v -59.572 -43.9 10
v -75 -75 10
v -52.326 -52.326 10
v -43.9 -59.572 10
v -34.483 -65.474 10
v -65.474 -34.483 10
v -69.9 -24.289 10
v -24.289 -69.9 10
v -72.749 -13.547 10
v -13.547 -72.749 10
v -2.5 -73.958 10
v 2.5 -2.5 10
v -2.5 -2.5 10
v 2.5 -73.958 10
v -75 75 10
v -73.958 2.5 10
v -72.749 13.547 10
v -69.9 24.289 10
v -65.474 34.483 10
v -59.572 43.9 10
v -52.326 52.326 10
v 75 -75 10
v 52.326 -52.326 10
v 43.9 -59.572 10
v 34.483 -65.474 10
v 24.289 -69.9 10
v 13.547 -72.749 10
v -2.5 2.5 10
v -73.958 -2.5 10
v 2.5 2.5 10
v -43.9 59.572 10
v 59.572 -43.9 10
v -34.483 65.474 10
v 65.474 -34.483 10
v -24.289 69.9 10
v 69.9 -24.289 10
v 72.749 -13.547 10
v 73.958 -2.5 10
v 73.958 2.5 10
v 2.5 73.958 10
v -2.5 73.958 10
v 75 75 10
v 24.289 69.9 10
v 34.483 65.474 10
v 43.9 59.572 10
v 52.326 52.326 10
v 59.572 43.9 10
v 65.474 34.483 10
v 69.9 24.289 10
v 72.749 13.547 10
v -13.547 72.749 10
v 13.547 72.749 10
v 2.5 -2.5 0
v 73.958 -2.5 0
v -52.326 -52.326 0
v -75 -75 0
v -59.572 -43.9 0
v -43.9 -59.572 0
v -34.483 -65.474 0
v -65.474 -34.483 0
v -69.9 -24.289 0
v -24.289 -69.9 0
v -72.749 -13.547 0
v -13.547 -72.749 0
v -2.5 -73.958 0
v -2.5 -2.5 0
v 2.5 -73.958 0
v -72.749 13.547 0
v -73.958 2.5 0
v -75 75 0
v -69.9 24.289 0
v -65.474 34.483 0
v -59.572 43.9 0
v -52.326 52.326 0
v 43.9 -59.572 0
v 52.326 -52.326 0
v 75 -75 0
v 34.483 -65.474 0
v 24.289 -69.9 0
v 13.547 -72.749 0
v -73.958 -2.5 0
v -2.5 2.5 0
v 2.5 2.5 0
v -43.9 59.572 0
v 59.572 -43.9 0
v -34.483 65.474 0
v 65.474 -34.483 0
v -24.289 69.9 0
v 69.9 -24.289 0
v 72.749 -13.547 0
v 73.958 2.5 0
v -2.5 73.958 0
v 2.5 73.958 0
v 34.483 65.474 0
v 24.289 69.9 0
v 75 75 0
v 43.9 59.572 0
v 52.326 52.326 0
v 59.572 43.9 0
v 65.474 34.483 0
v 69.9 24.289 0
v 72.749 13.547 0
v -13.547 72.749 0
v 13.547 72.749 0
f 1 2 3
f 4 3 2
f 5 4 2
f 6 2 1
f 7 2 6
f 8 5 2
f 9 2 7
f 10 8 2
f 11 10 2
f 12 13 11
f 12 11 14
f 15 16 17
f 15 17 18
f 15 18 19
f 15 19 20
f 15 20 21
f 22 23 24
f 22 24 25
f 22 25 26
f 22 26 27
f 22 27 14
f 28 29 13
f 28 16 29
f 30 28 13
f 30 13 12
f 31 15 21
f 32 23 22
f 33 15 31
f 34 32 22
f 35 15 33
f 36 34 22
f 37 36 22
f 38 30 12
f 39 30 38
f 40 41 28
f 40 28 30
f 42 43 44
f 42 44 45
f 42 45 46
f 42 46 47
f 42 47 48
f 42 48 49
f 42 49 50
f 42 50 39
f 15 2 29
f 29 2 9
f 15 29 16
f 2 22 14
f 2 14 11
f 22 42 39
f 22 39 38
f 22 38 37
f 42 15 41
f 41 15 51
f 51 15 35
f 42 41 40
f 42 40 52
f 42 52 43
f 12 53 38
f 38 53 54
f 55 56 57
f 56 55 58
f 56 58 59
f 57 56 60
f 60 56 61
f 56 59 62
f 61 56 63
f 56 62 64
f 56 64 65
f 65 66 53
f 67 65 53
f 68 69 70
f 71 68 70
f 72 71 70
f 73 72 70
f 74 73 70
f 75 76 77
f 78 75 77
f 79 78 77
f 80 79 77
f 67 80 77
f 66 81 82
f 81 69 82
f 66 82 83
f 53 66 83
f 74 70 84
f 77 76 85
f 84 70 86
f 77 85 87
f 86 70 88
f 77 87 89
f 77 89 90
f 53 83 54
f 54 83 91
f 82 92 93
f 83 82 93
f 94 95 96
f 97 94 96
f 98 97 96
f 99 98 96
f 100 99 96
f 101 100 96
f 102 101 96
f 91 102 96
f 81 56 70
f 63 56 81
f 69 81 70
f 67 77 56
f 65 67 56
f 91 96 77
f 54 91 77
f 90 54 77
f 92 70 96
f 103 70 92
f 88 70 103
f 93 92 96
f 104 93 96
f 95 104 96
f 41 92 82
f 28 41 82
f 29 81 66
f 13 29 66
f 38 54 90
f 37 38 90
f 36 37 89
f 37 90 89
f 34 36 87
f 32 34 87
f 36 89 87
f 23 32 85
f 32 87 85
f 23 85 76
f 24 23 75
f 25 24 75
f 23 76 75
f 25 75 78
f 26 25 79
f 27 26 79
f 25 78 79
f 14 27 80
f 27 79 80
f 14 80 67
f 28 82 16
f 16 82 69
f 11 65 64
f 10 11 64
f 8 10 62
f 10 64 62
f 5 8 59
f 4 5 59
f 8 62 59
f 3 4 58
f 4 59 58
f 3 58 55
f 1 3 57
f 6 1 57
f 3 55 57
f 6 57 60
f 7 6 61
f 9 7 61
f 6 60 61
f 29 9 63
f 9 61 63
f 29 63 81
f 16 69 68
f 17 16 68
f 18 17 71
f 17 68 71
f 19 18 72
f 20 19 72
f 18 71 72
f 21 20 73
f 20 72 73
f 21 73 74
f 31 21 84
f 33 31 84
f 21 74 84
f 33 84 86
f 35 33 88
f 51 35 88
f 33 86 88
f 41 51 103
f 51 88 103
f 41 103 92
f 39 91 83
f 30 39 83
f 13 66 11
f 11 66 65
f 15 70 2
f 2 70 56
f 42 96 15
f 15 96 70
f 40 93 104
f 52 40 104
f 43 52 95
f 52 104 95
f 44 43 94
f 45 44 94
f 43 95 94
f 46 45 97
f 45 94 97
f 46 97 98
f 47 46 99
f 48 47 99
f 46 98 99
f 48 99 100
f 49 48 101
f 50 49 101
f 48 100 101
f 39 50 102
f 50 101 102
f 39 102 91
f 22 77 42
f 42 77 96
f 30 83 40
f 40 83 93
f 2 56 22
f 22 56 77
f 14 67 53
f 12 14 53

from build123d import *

# Parameters (mm, degrees)
F0_W     = 5
F0_H     = 5
F1_DEPTH = 10


with BuildPart() as f1:
    # F0 (on Top) → F1 (new body)
    with BuildSketch(Plane.XY):
        with BuildLine():
            Line((2.5, -2.5), (73.9577582137, -2.5))
            ThreePointArc((73.9577582137, -2.5), (73.9894387998, -1.2501784241), (74, 0))
            ThreePointArc((74, 0), (73.9894387998, 1.2501784241), (73.9577582137, 2.5))
            Line((73.9577582137, 2.5), (2.5, 2.5))
            Line((2.5, 2.5), (2.5, -2.5))
        make_face()
        with BuildLine():
            Line((-2.5, 2.5), (2.5, 2.5))
            Line((2.5, 2.5), (2.5, 73.9577582137))
            ThreePointArc((2.5, 73.9577582137), (0, 74), (-2.5, 73.9577582137))
            Line((-2.5, 73.9577582137), (-2.5, 2.5))
        make_face()
        with BuildLine():
            ThreePointArc((-2.5, -73.9577582137), (0, -74), (2.5, -73.9577582137))
            Line((2.5, -73.9577582137), (2.5, -2.5))
            Line((2.5, -2.5), (-2.5, -2.5))
            Line((-2.5, -2.5), (-2.5, -73.9577582137))
        make_face()
        with BuildLine():
            Line((-75, 2.5), (-75, -2.5))
            Line((-75, -2.5), (-73.9577582137, -2.5))
            ThreePointArc((-73.9577582137, -2.5), (-74, 0), (-73.9577582137, 2.5))
            Line((-73.9577582137, 2.5), (-75, 2.5))
        make_face()
        with BuildLine():
            Line((2.5, 73.9577582137), (2.5, 75))
            Line((2.5, 75), (-2.5, 75))
            Line((-2.5, 75), (-2.5, 73.9577582137))
            ThreePointArc((-2.5, 73.9577582137), (0, 74), (2.5, 73.9577582137))
        make_face()
        with BuildLine():
            Line((-2.5, -75), (2.5, -75))
            Line((2.5, -75), (2.5, -73.9577582137))
            ThreePointArc((2.5, -73.9577582137), (0, -74), (-2.5, -73.9577582137))
            Line((-2.5, -73.9577582137), (-2.5, -75))
        make_face()
        with BuildLine():
            Line((-73.9577582137, -2.5), (-2.5, -2.5))
            Line((-2.5, -2.5), (-2.5, 2.5))
            Line((-2.5, 2.5), (-73.9577582137, 2.5))
            ThreePointArc((-73.9577582137, 2.5), (-74, 0), (-73.9577582137, -2.5))
        make_face()
        with BuildLine():
            Line((73.9577582137, -2.5), (75, -2.5))
            Line((75, -2.5), (75, 2.5))
            Line((75, 2.5), (73.9577582137, 2.5))
            ThreePointArc((73.9577582137, 2.5), (73.9894387998, 1.2501784241), (74, 0))
            ThreePointArc((74, 0), (73.9894387998, -1.2501784241), (73.9577582137, -2.5))
        make_face()
        Rectangle(F0_W, F0_H)
        with BuildLine():
            Line((-75, -75), (-2.5, -75))
            Line((-2.5, -75), (-2.5, -73.9577582137))
            ThreePointArc((-2.5, -73.9577582137), (-52.3259018078, -52.3259018078), (-73.9577582137, -2.5))
            Line((-73.9577582137, -2.5), (-75, -2.5))
            Line((-75, -2.5), (-75, -75))
        make_face()
        with BuildLine():
            Line((2.5, -75), (75, -75))
            Line((75, -75), (75, -2.5))
            Line((75, -2.5), (73.9577582137, -2.5))
            ThreePointArc((73.9577582137, -2.5), (52.3259018078, -52.3259018078), (2.5, -73.9577582137))
            Line((2.5, -73.9577582137), (2.5, -75))
        make_face()
        with BuildLine():
            Line((-75, 75), (-75, 2.5))
            Line((-75, 2.5), (-73.9577582137, 2.5))
            ThreePointArc((-73.9577582137, 2.5), (-52.3259018078, 52.3259018078), (-2.5, 73.9577582137))
            Line((-2.5, 73.9577582137), (-2.5, 75))
            Line((-2.5, 75), (-75, 75))
        make_face()
        with BuildLine():
            Line((73.9577582137, 2.5), (75, 2.5))
            Line((75, 2.5), (75, 75))
            Line((75, 75), (2.5, 75))
            Line((2.5, 75), (2.5, 73.9577582137))
            ThreePointArc((2.5, 73.9577582137), (52.3259018078, 52.3259018078), (73.9577582137, 2.5))
        make_face()
    extrude(amount=F1_DEPTH)


solid = f1.part
